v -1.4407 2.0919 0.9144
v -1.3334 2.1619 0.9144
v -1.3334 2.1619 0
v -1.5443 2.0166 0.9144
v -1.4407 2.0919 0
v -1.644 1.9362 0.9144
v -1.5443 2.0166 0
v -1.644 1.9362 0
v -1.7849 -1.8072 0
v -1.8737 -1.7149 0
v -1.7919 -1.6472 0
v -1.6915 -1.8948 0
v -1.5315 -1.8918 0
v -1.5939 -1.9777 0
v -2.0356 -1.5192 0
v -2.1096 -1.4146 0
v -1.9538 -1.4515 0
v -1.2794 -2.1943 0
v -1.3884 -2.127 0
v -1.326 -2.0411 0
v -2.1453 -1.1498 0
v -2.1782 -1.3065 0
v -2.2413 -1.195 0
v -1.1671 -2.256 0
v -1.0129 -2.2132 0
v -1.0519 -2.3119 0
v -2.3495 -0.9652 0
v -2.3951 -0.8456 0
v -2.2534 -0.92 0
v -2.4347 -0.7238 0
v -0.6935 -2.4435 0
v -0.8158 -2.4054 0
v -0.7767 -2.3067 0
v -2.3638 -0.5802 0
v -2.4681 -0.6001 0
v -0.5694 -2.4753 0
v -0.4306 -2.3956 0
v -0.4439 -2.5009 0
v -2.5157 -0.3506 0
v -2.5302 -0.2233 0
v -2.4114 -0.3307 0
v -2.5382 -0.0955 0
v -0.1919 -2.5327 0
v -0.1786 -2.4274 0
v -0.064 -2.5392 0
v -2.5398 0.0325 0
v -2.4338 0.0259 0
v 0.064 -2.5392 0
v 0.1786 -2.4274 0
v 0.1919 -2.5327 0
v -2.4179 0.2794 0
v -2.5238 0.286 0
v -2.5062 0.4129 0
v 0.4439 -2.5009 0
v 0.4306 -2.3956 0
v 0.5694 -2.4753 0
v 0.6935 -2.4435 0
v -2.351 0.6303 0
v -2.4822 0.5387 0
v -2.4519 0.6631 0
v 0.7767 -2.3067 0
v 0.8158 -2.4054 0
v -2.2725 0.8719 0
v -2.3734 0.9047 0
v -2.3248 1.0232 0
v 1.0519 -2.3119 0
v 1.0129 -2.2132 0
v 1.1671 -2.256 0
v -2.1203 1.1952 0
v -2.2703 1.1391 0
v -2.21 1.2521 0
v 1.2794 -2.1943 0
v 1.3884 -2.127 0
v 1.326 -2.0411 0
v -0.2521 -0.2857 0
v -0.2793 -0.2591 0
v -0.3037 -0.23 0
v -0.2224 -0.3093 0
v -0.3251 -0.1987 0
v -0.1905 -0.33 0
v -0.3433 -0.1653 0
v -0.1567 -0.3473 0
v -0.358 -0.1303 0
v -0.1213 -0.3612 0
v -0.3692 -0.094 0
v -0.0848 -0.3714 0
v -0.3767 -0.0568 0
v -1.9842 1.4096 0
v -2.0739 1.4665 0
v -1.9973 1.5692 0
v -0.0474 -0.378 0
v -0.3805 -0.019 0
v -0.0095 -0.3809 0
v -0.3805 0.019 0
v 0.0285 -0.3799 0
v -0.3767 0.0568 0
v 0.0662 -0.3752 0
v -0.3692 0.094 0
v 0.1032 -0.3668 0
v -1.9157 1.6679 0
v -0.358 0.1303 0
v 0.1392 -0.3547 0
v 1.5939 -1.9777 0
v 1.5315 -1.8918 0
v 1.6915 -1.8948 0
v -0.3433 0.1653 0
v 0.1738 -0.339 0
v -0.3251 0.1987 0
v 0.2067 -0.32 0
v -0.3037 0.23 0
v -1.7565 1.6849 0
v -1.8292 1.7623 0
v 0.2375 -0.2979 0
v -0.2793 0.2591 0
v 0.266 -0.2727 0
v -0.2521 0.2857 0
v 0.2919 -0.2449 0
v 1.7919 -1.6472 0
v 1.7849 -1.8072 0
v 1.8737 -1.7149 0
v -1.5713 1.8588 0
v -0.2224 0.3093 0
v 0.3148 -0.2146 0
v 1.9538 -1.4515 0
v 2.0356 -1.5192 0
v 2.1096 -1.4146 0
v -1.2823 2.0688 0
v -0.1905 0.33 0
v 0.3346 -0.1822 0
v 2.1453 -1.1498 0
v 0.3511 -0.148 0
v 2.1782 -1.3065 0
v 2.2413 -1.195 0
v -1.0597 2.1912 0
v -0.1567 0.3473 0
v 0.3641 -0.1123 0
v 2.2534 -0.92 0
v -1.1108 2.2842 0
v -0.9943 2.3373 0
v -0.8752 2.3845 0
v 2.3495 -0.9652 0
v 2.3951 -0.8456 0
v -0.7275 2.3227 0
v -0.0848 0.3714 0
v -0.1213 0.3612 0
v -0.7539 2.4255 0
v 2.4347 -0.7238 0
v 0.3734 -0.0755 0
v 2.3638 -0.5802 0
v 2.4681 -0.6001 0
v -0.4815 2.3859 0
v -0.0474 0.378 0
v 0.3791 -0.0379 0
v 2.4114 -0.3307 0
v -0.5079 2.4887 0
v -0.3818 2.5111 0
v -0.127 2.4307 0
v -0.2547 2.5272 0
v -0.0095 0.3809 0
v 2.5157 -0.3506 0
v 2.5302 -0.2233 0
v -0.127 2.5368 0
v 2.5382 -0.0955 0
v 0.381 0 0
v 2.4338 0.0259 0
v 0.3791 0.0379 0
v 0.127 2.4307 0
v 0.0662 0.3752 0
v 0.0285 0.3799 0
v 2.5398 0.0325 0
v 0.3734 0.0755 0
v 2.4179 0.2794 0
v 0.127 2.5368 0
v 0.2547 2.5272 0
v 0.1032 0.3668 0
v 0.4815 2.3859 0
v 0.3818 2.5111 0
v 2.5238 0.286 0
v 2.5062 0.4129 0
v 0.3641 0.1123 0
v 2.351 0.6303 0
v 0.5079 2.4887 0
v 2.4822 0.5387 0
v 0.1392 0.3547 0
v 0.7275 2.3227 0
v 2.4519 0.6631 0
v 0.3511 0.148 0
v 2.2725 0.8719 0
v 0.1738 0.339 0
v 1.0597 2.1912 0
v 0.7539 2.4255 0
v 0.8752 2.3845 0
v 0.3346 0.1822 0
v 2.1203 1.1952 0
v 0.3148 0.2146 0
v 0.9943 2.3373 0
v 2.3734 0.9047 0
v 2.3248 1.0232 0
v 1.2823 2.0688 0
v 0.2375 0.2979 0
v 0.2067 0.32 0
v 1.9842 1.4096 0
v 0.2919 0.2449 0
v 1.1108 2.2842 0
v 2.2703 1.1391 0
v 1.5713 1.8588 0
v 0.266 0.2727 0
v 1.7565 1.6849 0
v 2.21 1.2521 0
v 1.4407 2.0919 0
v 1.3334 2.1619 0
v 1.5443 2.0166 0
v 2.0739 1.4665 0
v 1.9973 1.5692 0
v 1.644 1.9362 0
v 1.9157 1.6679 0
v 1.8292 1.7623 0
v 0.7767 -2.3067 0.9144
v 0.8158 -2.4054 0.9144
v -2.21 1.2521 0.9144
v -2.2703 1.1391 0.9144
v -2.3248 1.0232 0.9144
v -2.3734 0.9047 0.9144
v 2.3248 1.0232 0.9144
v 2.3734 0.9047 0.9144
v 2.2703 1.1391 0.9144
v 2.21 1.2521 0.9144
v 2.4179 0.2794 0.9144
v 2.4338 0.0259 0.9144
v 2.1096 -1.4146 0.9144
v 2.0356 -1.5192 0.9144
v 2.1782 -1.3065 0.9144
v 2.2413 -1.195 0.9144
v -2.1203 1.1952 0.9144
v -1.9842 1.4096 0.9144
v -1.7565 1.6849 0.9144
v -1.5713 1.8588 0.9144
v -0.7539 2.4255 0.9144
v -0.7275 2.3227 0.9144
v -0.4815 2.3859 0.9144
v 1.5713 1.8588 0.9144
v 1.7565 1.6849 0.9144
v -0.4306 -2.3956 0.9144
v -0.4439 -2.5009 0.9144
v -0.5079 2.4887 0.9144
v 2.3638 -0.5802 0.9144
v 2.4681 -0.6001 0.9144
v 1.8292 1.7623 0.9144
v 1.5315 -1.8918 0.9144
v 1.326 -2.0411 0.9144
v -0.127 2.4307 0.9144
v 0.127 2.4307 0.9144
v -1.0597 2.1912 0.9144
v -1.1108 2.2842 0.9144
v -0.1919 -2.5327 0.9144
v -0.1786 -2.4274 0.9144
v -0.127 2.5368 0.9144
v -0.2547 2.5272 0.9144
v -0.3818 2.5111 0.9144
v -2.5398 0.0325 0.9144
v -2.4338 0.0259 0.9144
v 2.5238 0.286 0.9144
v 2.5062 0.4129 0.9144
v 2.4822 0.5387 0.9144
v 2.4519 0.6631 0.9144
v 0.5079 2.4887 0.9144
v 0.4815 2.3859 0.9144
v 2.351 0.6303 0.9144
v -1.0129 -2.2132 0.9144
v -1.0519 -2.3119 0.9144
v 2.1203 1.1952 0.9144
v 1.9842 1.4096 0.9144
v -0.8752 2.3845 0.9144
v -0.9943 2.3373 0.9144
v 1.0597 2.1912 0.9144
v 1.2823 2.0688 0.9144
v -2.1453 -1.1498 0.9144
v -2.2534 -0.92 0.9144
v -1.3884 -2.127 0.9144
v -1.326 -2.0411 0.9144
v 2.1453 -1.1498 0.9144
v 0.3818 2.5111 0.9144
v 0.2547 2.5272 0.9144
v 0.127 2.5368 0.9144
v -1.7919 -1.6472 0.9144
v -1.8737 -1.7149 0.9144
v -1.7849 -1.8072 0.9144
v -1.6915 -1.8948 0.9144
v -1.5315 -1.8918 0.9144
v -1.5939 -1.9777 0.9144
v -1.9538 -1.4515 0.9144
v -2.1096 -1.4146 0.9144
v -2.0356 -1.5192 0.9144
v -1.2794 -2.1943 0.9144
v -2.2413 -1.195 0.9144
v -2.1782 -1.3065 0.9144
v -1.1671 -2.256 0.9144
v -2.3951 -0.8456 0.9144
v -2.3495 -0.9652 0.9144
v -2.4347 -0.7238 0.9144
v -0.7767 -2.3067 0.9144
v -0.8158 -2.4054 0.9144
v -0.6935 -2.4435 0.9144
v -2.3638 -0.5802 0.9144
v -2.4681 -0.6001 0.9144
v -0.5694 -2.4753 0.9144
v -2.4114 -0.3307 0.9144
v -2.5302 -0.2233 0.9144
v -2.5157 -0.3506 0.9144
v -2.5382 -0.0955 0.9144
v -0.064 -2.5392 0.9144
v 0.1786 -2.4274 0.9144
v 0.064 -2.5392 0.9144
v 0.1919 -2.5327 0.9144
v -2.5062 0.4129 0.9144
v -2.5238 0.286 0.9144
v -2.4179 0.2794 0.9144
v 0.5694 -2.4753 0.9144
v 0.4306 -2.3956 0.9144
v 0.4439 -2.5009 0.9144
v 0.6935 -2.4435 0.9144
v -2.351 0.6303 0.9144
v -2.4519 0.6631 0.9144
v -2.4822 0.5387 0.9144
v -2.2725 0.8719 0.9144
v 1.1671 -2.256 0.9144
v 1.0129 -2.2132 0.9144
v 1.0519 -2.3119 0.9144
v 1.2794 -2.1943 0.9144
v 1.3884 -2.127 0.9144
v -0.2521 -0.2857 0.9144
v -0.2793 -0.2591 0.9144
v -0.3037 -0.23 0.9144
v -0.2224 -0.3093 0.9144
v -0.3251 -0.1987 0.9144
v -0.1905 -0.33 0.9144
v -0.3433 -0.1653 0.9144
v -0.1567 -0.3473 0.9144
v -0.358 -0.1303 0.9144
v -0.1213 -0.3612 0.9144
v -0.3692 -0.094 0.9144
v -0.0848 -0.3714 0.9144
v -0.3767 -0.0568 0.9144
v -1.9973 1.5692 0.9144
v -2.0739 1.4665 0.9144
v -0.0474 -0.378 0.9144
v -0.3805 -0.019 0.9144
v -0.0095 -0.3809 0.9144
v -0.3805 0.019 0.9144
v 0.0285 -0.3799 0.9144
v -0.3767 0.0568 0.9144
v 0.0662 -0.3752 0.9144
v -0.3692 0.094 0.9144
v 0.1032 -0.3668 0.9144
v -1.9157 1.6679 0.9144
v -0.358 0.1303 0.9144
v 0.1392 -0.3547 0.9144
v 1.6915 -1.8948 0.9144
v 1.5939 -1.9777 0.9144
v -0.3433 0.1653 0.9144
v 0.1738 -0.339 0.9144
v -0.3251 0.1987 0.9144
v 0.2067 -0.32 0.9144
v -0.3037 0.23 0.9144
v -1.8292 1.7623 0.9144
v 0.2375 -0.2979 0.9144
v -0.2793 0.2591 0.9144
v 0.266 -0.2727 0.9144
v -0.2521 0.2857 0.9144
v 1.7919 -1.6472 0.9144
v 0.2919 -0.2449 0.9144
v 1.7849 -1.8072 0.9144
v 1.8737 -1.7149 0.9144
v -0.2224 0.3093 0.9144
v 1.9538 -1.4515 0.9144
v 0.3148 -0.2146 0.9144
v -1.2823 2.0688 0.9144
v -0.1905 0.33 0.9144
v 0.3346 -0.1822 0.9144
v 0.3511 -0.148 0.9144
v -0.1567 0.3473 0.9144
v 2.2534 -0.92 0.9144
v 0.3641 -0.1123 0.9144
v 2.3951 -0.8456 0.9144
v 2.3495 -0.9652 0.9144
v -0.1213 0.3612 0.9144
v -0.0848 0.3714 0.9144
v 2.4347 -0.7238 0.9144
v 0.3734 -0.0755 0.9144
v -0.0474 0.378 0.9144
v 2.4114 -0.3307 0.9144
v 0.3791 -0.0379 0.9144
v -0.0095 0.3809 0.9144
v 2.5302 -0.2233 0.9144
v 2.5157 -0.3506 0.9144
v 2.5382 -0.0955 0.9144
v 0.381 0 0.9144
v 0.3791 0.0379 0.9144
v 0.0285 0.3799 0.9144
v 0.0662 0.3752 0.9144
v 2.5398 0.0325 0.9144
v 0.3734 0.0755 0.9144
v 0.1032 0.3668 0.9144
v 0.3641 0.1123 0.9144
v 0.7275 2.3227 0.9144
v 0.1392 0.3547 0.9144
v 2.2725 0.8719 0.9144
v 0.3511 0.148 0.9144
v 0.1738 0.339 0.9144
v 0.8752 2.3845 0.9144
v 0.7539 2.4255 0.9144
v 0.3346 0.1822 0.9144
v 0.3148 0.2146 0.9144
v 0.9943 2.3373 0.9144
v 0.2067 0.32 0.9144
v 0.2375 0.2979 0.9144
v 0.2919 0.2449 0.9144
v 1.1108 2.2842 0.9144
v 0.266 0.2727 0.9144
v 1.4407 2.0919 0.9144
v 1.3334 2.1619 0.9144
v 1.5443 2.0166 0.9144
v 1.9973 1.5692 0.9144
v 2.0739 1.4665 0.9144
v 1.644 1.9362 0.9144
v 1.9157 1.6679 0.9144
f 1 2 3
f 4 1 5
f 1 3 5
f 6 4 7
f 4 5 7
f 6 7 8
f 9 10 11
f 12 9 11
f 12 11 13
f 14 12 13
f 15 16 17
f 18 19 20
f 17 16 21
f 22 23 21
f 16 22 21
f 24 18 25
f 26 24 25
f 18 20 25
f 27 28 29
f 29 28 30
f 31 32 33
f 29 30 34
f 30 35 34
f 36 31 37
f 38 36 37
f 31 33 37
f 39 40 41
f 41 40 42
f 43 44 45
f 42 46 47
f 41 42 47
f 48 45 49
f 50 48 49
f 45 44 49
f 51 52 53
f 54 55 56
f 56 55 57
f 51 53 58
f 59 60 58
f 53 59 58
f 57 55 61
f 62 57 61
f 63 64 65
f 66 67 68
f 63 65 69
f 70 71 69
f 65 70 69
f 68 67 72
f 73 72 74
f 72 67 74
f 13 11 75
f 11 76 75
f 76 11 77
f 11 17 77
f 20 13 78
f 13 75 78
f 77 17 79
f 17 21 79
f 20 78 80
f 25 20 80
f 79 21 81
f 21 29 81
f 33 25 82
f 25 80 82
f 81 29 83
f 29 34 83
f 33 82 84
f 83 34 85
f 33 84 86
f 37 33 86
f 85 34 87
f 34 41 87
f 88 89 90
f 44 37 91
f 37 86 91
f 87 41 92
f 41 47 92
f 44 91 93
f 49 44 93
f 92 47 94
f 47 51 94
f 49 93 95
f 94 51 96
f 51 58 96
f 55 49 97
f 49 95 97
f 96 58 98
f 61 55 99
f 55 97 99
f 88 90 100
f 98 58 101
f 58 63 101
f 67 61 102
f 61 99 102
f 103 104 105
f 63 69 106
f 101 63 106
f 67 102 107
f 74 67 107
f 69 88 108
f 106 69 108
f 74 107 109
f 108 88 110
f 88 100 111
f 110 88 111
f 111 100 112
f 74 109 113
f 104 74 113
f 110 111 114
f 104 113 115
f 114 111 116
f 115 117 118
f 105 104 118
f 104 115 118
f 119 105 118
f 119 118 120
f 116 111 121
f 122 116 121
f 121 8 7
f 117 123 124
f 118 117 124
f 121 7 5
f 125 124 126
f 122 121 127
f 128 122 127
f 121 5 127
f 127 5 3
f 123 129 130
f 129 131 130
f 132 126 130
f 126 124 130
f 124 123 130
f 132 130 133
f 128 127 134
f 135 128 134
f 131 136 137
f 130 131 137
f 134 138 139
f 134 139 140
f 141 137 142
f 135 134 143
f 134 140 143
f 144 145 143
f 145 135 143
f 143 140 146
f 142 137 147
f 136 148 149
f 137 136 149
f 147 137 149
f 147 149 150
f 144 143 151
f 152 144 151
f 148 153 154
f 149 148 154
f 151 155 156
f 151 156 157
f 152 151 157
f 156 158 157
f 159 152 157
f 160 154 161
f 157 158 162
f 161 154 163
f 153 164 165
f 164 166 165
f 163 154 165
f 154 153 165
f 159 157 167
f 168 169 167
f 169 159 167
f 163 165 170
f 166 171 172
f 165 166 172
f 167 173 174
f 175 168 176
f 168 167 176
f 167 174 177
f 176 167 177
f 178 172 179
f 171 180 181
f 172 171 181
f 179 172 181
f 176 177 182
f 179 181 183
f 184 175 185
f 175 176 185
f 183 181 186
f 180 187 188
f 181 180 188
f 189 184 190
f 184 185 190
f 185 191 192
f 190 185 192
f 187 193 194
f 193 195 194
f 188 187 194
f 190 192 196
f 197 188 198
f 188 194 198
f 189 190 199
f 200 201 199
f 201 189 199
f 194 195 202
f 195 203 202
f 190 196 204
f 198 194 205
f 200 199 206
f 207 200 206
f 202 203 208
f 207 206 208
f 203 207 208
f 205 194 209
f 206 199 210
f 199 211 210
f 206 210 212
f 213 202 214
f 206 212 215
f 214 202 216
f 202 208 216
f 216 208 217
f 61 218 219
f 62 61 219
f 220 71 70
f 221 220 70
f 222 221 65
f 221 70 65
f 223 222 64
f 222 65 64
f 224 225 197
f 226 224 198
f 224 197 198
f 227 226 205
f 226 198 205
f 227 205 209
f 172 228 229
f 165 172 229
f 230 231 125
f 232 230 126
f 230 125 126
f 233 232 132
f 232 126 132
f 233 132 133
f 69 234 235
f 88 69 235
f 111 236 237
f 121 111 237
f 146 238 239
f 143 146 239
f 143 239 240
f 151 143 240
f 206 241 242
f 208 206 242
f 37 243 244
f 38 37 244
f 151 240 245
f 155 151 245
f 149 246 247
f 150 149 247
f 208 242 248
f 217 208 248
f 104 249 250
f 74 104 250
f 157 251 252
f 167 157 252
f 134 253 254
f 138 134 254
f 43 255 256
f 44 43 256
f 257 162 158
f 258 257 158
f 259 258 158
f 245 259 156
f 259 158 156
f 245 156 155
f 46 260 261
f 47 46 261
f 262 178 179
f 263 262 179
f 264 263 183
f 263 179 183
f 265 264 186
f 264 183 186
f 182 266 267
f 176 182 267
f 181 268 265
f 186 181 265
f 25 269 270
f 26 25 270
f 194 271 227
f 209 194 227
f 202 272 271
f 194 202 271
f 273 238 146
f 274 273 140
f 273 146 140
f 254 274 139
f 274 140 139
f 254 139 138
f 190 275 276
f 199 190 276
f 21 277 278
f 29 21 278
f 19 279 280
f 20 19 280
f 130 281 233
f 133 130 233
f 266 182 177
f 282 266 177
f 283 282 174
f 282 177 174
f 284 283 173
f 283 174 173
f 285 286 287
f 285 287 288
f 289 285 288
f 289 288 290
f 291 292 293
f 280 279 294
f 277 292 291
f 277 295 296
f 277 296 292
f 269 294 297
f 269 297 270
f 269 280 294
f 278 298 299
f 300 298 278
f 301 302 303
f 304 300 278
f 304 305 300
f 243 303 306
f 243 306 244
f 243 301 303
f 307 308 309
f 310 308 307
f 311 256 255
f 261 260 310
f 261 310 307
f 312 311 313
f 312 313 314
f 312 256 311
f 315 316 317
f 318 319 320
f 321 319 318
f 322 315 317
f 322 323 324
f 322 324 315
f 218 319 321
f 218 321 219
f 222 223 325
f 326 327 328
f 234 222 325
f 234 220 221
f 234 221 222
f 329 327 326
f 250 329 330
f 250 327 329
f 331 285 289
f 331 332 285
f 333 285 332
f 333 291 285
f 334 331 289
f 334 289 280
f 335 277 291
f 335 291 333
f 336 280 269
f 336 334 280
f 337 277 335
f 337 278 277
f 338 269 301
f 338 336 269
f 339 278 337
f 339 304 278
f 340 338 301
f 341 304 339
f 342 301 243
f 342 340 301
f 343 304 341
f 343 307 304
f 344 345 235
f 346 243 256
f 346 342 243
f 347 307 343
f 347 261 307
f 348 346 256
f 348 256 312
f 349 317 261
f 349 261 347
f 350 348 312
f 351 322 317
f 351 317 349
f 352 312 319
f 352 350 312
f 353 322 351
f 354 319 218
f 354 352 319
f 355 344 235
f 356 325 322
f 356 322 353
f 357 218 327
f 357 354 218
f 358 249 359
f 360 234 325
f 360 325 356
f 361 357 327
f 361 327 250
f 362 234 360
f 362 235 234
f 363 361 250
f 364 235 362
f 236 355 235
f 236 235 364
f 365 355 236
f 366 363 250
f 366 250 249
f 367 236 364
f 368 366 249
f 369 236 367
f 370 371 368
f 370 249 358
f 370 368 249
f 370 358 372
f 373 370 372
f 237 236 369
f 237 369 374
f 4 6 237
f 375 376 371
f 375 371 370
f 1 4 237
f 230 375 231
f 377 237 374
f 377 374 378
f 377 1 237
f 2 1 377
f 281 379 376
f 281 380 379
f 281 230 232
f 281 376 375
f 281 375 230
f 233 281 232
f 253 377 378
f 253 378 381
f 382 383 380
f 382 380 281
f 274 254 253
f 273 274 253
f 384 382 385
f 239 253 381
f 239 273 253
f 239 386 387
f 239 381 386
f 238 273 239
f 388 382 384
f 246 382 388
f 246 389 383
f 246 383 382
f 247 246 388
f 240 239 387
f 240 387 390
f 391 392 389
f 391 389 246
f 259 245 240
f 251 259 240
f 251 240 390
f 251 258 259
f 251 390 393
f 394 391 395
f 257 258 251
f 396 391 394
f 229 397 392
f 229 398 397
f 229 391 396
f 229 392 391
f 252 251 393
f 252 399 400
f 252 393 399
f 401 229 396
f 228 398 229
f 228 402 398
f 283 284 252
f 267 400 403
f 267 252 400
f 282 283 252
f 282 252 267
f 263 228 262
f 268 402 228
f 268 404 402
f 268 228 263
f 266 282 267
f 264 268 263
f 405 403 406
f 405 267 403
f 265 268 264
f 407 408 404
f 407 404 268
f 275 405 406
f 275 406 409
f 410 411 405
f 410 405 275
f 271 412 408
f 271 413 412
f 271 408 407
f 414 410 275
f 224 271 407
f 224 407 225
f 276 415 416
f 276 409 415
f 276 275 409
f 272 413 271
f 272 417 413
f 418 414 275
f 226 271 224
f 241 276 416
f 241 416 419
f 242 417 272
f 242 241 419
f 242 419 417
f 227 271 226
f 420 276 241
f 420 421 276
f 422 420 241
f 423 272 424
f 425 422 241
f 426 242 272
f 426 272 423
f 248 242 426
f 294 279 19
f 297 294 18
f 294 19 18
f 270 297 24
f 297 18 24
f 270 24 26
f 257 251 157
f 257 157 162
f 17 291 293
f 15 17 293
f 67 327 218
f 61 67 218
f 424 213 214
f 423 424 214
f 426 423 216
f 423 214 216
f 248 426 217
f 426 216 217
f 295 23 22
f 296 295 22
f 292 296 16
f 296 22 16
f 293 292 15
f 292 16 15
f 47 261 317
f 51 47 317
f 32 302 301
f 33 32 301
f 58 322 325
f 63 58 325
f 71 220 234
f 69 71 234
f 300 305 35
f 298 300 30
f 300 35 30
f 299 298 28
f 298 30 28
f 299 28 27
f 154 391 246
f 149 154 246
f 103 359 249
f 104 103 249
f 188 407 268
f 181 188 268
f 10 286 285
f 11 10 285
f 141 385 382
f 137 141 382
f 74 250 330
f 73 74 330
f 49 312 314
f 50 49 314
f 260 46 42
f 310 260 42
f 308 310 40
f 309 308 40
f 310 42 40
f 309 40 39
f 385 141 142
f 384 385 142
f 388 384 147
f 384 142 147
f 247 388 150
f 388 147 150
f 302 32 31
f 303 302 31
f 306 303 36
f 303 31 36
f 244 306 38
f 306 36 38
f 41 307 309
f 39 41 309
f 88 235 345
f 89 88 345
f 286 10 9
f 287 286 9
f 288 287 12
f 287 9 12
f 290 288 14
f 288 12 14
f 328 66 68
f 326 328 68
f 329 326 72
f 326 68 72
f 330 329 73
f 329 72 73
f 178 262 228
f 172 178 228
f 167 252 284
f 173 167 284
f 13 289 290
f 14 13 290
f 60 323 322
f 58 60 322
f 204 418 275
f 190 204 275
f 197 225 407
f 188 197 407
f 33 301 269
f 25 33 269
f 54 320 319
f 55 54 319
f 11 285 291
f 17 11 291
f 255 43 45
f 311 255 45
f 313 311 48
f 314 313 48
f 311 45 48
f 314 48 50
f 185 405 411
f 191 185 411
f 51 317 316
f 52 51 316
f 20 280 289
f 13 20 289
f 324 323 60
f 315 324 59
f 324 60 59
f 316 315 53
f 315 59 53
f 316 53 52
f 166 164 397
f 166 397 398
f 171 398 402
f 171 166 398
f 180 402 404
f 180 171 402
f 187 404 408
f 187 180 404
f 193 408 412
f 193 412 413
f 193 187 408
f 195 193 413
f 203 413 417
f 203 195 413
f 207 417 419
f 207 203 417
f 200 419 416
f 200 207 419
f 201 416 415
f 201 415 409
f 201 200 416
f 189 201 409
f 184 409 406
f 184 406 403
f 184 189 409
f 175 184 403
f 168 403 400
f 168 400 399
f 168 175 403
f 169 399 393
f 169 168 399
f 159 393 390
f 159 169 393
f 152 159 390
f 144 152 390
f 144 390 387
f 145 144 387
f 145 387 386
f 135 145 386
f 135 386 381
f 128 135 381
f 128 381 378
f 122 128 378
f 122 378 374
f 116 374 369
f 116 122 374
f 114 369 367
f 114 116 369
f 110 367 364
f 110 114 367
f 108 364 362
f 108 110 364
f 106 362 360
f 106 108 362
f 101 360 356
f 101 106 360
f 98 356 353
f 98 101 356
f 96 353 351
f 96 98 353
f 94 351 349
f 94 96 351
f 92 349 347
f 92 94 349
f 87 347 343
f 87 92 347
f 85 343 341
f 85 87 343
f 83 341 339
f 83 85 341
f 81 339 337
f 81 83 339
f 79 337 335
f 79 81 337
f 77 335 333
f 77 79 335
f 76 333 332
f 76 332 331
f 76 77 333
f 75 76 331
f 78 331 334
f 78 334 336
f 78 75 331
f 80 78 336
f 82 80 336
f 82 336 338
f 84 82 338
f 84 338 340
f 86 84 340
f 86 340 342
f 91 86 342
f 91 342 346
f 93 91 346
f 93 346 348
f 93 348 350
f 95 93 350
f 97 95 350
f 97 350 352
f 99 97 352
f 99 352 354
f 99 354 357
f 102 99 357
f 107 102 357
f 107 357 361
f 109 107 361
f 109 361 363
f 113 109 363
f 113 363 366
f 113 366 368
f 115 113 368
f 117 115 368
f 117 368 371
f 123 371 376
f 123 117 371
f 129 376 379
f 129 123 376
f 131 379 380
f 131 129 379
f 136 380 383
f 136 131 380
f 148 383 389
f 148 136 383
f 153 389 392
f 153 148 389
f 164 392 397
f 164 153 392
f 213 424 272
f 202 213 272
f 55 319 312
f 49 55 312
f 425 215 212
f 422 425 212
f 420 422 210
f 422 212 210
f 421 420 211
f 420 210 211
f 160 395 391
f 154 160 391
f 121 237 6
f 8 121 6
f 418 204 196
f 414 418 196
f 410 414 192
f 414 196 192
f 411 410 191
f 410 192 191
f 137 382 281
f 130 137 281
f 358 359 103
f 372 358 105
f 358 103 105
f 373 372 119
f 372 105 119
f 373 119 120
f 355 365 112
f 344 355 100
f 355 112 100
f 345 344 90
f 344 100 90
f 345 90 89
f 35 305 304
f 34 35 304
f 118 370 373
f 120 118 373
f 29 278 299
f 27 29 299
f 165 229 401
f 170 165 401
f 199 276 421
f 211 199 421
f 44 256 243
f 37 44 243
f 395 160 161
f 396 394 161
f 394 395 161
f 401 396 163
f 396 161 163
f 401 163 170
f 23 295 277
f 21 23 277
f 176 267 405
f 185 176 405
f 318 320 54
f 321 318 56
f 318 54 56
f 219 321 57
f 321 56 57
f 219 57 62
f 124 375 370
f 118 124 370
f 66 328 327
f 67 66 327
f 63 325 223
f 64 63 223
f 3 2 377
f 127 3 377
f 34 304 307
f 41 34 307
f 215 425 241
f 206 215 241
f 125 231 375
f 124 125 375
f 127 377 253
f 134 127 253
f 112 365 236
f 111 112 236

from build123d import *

# Parameters (mm, degrees)
F0_R     = 2.54
F0_R_2   = 0.381
F1_DEPTH = 0.9144
F2_W     = 0.254
F2_H     = 0.237537
F3_DEPTH = 25.4


with BuildPart() as f1:
    # F0 (on Top) → F1 (new body)
    with BuildSketch(Plane.XY):
        Circle(F0_R)
        Circle(F0_R_2, mode=Mode.SUBTRACT)
    extrude(amount=F1_DEPTH)

    # F2 (on face) → F3 (cut)
    with BuildSketch(Plane.XY.offset(0.9144)):
        with Locations((0, 2.549438)):
            Rectangle(F2_W, F2_H)
        Polygon((-0.481473, 2.38589), (-0.540546, 2.615964), (-0.786566, 2.552797), (-0.727493, 2.322722), align=None)
        Polygon((-1.059693, 2.191195), (-1.174128, 2.39935), (-1.39671, 2.276985), (-1.282275, 2.06883), align=None)
        Polygon((-1.571329, 1.85882), (-1.733934, 2.031977), (-1.919092, 1.858102), (-1.756487, 1.684945), align=None)
        Polygon((-1.984232, 1.409648), (-2.184792, 1.536927), (-2.320892, 1.322467), (-2.120332, 1.195188), align=None)
        Polygon((-2.272459, 0.871902), (-2.498371, 0.945306), (-2.576861, 0.703737), (-2.35095, 0.630334), align=None)
        Polygon((-2.417899, 0.279372), (-2.654968, 0.294288), (-2.670916, 0.040789), (-2.433848, 0.025874), align=None)
        Polygon((-2.411413, -0.330712), (-2.644743, -0.375222), (-2.597148, -0.624723), (-2.363819, -0.580213), align=None)
        Polygon((-2.25341, -0.920016), (-2.46834, -1.021154), (-2.360192, -1.25098), (-2.145262, -1.149842), align=None)
        Polygon((-1.953816, -1.451512), (-2.136842, -1.602924), (-1.974936, -1.798634), (-1.79191, -1.647222), align=None)
        Polygon((-1.531457, -1.891804), (-1.671078, -2.083976), (-1.465588, -2.233274), (-1.325967, -2.041102), align=None)
        Polygon((-1.012871, -2.213228), (-1.100314, -2.434084), (-0.864151, -2.527588), (-0.776708, -2.306732), align=None)
        Polygon((-0.430642, -2.395586), (-0.460414, -2.63125), (-0.208416, -2.663085), (-0.178645, -2.427421), align=None)
        Polygon((0.178645, -2.427421), (0.208416, -2.663085), (0.460414, -2.63125), (0.430642, -2.395586), align=None)
        Polygon((0.776708, -2.306732), (0.864151, -2.527588), (1.100314, -2.434084), (1.012871, -2.213228), align=None)
        Polygon((1.325967, -2.041102), (1.465588, -2.233274), (1.671078, -2.083976), (1.531457, -1.891804), align=None)
        Polygon((1.79191, -1.647222), (1.974936, -1.798634), (2.136842, -1.602924), (1.953816, -1.451512), align=None)
        Polygon((2.145262, -1.149842), (2.360192, -1.25098), (2.46834, -1.021154), (2.25341, -0.920016), align=None)
        Polygon((2.363819, -0.580213), (2.597148, -0.624723), (2.644743, -0.375222), (2.411413, -0.330712), align=None)
        Polygon((2.433848, 0.025874), (2.670916, 0.040789), (2.654968, 0.294288), (2.417899, 0.279372), align=None)
        Polygon((2.35095, 0.630334), (2.576861, 0.703737), (2.498371, 0.945306), (2.272459, 0.871902), align=None)
        Polygon((2.120332, 1.195188), (2.320892, 1.322467), (2.184792, 1.536927), (1.984232, 1.409648), align=None)
        Polygon((1.756487, 1.684945), (1.919092, 1.858102), (1.733934, 2.031977), (1.571329, 1.85882), align=None)
        Polygon((1.282275, 2.06883), (1.39671, 2.276985), (1.174128, 2.39935), (1.059693, 2.191195), align=None)
        Polygon((0.727493, 2.322722), (0.786566, 2.552797), (0.540546, 2.615964), (0.481473, 2.38589), align=None)
    extrude(amount=-F3_DEPTH, mode=Mode.SUBTRACT)


solid = f1.part
